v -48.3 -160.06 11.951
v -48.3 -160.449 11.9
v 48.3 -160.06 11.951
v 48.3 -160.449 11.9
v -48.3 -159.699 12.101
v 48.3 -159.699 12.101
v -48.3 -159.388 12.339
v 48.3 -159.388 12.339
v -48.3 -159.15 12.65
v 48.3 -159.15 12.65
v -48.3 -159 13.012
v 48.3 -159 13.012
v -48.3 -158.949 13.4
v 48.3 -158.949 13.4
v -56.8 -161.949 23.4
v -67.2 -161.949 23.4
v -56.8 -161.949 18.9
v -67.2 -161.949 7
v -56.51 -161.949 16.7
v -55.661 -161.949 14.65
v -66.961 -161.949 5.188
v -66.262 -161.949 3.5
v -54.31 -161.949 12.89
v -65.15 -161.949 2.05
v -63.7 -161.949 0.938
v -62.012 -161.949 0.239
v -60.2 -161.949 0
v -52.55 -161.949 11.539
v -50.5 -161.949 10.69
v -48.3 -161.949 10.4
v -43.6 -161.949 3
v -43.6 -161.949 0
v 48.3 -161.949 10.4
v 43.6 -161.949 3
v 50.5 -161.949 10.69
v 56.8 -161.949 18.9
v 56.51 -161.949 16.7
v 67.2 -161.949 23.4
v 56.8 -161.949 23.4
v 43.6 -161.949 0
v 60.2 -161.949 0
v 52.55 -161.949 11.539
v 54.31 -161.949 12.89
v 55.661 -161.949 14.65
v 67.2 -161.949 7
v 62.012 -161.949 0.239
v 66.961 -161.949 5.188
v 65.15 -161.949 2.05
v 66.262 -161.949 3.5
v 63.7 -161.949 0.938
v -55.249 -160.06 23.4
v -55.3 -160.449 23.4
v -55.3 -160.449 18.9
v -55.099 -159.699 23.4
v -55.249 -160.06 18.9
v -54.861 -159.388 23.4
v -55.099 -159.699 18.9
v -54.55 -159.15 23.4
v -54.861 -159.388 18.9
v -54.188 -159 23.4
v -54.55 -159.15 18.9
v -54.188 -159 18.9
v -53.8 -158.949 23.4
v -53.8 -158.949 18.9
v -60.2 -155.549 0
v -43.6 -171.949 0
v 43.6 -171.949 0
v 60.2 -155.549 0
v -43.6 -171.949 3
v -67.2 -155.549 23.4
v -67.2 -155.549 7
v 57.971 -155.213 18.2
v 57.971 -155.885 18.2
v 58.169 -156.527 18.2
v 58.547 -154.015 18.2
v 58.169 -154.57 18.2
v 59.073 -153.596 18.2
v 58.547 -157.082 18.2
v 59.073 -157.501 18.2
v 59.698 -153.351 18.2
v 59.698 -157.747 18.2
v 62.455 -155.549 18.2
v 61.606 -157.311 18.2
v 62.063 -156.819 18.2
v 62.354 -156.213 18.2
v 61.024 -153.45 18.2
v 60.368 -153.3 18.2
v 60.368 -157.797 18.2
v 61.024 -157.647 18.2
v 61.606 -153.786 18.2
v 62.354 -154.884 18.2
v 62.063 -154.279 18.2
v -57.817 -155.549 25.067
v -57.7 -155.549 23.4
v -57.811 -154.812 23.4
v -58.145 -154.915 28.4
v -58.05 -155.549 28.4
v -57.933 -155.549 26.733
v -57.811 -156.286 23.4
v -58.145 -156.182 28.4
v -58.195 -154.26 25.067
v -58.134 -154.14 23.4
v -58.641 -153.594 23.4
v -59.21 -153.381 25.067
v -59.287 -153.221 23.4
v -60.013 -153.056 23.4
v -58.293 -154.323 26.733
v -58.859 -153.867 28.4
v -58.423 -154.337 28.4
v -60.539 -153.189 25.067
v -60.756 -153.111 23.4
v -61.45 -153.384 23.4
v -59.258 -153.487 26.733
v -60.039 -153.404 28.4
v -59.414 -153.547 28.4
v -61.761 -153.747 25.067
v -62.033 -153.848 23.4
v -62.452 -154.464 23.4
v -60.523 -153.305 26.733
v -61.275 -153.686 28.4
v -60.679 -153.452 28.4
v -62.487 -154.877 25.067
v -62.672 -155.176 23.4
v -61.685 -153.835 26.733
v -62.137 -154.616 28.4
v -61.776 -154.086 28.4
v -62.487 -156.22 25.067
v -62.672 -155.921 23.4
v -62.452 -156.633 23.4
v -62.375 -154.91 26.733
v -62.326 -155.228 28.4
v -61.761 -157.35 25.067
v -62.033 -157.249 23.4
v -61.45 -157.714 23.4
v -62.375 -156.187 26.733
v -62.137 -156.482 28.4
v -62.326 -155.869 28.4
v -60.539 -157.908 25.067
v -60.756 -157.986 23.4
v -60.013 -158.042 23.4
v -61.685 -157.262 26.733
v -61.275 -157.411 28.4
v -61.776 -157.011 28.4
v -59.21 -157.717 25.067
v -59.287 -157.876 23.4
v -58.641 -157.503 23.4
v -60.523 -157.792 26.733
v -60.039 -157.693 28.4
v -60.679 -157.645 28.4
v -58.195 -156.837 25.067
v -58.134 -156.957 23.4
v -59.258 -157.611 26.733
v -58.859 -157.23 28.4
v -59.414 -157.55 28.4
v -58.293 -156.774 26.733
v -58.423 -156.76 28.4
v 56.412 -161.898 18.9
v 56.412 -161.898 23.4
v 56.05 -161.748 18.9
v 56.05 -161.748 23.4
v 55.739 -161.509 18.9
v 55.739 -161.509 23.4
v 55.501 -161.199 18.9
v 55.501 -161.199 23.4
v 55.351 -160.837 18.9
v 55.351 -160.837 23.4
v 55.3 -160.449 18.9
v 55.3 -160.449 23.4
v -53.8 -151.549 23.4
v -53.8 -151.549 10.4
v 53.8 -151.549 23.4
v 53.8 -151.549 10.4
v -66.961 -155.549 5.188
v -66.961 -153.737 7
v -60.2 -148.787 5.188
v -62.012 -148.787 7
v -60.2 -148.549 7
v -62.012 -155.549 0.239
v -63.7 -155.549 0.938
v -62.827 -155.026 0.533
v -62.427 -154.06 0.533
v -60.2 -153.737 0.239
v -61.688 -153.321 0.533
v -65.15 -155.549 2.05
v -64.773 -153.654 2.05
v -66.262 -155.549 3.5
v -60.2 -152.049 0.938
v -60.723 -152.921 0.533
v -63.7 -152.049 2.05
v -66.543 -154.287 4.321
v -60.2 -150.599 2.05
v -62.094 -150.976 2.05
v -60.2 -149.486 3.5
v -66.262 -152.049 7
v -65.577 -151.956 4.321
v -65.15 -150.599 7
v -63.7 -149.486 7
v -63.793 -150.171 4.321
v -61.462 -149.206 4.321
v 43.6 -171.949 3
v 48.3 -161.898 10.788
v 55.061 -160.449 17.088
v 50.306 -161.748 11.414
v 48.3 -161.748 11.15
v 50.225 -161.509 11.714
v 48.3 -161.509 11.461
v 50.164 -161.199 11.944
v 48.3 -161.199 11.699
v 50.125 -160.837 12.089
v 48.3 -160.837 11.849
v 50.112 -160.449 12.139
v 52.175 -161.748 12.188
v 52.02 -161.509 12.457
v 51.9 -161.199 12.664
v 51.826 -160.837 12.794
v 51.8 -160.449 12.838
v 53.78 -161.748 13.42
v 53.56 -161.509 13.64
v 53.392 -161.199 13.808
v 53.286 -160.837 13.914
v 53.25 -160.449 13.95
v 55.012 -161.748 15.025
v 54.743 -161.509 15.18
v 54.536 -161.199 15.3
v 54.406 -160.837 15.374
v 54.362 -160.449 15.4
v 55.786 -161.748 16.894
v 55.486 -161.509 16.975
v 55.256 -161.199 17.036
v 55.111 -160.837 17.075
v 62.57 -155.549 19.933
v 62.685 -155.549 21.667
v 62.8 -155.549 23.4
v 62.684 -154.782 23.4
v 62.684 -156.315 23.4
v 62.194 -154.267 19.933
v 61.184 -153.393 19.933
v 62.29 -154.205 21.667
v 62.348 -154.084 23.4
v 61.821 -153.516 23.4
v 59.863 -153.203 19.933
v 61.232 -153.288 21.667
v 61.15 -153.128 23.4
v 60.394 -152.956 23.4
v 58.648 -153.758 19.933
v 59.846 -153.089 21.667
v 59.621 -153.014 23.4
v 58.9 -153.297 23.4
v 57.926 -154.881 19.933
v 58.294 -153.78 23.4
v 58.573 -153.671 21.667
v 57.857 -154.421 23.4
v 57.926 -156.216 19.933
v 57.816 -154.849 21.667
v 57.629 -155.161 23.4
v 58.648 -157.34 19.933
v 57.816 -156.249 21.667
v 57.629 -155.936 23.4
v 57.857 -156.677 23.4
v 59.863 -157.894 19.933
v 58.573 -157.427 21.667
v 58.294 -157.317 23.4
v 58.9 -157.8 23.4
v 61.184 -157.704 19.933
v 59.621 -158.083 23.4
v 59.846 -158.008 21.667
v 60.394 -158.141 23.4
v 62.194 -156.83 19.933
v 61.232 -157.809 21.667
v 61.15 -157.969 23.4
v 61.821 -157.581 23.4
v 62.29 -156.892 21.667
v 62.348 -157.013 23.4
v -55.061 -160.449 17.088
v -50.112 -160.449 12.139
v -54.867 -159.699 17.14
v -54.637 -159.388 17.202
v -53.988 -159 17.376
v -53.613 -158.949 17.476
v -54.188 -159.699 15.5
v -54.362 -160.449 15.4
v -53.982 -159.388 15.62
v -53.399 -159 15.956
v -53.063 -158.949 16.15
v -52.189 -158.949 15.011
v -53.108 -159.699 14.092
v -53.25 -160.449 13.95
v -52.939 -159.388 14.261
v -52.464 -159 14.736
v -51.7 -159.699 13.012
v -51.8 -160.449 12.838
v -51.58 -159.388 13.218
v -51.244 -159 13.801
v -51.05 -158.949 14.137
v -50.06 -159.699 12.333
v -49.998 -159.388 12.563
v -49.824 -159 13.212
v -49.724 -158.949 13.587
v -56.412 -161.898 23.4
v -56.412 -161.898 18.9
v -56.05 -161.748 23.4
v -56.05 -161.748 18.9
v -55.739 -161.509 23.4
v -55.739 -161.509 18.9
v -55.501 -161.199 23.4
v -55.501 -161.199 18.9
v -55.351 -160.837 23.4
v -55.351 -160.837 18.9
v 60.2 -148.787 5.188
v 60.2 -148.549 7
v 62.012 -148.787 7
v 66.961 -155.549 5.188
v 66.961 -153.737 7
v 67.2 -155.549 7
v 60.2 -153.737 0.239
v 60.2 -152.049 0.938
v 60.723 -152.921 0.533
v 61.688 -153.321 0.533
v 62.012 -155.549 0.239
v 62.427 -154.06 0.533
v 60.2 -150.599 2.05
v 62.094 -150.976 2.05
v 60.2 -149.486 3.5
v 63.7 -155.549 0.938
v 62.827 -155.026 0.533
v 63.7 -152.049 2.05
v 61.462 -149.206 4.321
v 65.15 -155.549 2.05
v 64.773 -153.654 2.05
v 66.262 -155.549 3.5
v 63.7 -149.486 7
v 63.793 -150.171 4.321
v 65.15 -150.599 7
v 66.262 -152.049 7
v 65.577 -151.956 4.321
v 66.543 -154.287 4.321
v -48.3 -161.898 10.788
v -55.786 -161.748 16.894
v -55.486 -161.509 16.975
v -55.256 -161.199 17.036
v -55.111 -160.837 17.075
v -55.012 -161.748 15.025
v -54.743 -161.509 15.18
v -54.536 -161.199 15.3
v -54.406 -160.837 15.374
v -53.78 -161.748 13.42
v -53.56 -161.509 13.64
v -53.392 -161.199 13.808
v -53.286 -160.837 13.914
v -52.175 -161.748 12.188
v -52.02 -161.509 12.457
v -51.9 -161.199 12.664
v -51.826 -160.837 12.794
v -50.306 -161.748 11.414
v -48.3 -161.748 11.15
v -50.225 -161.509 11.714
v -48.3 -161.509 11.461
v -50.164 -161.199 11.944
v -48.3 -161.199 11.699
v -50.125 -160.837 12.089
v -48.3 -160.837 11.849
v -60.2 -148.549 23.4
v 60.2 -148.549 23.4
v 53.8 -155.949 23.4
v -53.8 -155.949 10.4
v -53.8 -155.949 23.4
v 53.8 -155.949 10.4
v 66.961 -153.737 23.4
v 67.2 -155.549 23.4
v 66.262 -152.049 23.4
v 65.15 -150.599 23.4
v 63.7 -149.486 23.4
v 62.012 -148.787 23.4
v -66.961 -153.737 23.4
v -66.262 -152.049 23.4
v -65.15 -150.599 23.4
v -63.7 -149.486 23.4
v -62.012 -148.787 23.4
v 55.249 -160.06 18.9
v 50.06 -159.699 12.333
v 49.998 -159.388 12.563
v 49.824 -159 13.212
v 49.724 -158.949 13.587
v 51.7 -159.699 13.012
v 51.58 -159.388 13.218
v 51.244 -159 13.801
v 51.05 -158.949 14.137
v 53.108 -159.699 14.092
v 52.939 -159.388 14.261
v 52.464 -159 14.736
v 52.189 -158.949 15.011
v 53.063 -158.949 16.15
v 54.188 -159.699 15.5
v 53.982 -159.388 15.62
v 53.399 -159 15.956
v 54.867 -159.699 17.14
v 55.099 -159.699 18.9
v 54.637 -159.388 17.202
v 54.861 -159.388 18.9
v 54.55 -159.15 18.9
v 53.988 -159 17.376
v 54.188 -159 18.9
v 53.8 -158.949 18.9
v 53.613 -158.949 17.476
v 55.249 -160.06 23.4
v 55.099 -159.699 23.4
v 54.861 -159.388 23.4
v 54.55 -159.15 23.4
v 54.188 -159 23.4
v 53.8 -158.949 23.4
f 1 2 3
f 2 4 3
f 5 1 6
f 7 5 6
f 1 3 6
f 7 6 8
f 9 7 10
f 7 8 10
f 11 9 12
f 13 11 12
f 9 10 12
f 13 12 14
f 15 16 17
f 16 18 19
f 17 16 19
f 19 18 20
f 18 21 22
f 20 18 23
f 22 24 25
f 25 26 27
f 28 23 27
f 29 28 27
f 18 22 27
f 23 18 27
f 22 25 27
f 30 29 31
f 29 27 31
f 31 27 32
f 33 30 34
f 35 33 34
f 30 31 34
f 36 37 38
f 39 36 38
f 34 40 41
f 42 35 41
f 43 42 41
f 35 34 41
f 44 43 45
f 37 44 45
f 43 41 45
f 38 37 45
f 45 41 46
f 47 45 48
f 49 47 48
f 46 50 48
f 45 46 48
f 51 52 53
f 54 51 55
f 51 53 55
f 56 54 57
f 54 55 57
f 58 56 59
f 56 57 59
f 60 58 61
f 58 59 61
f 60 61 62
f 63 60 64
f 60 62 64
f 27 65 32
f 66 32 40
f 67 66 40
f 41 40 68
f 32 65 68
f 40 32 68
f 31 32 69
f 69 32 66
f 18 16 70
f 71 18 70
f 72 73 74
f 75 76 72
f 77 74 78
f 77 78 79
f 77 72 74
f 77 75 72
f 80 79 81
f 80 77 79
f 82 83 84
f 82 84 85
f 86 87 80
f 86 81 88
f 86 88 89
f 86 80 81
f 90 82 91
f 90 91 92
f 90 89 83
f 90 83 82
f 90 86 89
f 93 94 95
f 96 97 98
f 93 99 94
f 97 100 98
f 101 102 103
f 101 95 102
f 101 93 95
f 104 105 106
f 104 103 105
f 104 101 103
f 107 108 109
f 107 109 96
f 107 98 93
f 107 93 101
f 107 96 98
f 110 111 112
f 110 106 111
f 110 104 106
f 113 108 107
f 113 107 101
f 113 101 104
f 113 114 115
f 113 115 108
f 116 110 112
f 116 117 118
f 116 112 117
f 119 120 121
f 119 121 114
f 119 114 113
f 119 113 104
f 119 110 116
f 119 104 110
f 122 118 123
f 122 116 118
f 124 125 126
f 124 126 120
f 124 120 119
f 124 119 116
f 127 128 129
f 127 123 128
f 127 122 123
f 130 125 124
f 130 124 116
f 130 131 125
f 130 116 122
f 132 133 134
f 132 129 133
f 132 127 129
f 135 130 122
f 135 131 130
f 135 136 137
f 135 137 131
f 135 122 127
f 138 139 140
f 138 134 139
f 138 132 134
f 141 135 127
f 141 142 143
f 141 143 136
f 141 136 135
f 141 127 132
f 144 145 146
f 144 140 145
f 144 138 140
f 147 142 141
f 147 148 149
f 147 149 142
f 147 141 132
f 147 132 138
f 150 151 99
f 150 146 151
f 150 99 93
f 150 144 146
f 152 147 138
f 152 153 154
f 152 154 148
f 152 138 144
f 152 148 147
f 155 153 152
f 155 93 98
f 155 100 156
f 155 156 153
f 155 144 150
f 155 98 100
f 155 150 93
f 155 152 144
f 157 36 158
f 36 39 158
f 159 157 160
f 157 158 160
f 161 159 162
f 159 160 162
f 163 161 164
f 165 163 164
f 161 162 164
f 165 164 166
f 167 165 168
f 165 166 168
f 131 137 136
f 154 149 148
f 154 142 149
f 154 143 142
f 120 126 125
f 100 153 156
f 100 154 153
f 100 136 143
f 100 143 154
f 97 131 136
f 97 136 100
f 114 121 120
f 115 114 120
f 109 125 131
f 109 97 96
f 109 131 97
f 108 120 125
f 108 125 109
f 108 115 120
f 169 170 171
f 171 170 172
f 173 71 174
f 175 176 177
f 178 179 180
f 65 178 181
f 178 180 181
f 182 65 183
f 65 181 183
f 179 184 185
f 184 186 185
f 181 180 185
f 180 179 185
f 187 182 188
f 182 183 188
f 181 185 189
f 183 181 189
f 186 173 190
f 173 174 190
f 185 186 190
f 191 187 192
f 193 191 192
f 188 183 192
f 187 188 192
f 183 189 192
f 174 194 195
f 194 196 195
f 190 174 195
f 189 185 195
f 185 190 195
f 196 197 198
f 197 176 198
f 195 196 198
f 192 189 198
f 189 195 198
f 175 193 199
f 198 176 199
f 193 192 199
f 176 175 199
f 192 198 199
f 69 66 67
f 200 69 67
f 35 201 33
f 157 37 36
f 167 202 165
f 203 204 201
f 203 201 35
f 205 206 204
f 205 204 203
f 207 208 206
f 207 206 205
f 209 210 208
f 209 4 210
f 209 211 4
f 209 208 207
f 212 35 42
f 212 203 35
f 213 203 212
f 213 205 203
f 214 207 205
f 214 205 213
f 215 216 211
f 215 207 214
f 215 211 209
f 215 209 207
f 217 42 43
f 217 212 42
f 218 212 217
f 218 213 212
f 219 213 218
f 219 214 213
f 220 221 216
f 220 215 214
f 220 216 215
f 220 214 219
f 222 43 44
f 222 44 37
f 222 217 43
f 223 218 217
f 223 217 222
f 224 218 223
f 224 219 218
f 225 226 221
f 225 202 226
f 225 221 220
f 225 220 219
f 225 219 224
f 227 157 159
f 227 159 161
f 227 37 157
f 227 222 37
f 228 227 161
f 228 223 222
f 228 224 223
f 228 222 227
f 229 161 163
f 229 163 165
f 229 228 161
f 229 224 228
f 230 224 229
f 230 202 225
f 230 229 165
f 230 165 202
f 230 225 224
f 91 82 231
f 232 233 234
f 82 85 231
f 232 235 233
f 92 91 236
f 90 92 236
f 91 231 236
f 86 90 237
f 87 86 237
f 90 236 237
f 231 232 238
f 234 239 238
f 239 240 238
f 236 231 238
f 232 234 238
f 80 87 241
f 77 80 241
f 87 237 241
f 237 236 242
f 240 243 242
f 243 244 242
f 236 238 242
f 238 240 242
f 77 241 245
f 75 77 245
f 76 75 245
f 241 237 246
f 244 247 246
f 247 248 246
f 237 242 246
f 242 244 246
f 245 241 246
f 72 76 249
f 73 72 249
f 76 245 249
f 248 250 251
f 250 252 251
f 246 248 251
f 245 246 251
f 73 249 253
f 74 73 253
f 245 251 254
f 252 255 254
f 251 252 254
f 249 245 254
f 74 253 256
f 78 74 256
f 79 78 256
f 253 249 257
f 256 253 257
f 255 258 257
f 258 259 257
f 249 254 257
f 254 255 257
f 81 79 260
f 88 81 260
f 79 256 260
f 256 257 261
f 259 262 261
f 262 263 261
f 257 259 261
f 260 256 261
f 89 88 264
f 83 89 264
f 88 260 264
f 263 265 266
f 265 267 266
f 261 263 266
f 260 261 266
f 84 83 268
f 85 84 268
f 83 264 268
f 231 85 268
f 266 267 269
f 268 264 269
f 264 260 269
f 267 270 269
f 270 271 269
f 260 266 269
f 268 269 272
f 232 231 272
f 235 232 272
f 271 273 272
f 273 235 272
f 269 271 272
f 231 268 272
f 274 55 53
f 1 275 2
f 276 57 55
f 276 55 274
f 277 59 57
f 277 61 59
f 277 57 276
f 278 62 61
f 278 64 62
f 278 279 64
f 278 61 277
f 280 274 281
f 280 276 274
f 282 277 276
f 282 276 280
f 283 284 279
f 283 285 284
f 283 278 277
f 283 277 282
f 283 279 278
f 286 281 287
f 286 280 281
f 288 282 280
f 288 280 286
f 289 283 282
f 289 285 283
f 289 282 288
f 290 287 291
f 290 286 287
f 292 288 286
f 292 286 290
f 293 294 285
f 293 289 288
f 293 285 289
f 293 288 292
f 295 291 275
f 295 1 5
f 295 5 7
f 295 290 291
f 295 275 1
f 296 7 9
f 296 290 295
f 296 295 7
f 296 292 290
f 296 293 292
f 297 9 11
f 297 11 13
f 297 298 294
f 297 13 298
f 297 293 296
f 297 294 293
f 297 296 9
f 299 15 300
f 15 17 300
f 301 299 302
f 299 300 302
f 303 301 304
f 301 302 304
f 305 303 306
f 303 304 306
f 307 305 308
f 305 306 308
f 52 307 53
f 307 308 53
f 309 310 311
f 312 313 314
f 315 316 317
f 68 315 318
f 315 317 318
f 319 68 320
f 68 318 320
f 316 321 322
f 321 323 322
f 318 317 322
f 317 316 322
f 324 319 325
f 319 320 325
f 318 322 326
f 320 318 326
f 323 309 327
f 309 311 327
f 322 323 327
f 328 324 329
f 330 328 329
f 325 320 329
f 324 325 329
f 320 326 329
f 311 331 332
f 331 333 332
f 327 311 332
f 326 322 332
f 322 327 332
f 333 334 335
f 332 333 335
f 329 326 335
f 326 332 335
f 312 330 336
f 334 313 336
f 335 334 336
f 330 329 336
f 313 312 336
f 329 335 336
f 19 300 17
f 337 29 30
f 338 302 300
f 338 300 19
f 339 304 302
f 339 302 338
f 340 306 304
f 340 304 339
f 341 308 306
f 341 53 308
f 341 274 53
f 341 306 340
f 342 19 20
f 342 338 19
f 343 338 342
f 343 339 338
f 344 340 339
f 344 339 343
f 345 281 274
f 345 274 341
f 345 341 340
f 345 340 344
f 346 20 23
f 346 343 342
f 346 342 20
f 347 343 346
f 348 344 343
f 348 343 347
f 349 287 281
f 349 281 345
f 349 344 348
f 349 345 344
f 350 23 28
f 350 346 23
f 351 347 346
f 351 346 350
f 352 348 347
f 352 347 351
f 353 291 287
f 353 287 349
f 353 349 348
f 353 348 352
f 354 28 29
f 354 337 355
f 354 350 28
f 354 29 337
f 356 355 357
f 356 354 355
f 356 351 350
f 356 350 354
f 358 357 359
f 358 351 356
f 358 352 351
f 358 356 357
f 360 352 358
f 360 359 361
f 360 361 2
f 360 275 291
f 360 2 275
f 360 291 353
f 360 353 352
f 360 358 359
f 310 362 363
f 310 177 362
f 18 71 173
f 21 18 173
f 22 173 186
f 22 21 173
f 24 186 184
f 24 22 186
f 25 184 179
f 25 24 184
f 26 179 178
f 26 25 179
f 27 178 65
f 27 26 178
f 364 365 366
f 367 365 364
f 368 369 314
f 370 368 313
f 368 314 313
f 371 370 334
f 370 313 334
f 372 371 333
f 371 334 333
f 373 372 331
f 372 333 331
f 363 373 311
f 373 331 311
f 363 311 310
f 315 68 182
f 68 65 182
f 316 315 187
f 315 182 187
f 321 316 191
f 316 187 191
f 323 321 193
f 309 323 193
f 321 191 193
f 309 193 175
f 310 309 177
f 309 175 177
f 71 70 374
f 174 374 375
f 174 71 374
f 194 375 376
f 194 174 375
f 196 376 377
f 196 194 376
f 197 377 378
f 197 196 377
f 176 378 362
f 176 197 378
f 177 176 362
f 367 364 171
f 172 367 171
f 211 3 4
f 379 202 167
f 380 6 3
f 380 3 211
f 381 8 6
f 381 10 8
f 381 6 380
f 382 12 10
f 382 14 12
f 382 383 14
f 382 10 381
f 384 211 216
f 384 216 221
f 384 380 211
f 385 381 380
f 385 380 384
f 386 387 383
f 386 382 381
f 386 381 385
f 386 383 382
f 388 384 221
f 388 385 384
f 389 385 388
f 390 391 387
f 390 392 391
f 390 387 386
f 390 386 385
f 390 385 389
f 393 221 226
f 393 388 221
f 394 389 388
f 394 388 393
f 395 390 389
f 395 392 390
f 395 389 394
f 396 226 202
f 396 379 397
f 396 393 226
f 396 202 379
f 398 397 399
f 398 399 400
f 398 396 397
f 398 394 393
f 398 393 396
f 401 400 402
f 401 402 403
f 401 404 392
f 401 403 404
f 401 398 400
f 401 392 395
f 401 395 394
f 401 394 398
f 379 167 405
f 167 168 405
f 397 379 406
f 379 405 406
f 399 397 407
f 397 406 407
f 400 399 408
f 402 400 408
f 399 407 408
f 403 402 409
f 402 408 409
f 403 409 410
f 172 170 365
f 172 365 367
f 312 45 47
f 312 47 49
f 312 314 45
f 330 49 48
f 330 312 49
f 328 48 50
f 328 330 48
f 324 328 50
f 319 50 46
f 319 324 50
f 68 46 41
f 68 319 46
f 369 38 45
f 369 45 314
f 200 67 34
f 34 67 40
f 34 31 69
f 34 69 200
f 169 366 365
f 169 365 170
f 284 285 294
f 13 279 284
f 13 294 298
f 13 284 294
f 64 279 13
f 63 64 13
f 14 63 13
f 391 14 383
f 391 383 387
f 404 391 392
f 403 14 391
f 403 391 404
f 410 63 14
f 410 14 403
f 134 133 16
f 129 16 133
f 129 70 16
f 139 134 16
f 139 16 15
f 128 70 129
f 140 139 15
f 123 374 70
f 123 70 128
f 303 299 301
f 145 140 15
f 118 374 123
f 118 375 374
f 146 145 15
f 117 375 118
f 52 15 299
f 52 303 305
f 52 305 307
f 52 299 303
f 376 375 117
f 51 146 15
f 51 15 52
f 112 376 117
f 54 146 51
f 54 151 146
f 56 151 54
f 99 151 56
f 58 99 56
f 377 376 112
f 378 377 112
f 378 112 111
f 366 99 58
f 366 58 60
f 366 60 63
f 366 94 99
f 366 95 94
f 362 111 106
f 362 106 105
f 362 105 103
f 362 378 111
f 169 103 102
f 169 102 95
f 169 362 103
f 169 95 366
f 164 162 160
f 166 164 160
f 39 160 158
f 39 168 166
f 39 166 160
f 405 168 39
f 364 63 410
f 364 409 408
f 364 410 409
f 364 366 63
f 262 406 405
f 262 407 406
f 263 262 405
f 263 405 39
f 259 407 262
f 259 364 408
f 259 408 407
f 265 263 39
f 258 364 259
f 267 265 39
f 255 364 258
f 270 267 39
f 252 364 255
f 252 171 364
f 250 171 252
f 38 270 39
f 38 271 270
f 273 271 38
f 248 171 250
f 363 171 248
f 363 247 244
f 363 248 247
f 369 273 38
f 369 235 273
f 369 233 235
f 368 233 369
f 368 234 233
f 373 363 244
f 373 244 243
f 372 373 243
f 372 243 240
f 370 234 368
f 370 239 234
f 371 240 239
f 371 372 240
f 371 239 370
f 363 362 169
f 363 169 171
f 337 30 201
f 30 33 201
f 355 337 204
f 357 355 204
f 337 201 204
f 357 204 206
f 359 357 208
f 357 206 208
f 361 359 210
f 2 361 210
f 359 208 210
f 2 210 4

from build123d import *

# Parameters (mm, degrees)
EXTRUDE1_DEPTH     = 3
SKETCH3_W          = 134.4
SKETCH3_H          = 13.4
EXTRUDE2_DEPTH     = 7.4
SKETCH4_W          = 134.4
SKETCH4_H          = 13.4
SKETCH4_W_2        = 107.6
SKETCH4_H_2        = 4.4
EXTRUDE3_DEPTH     = 13
FILLET1_R          = 7
CUT_EXTRUDE1_DEPTH = 3
FILLET2_R          = 1.5
SKETCH7_R          = 2.5
EXTRUDE4_DEPTH     = 5
EXTRUDE4_TAPER     = 4
SKETCH8_R          = 2.6
CUT_EXTRUDE2_DEPTH = 5.2
CUT_EXTRUDE2_DRAFT = -3.8


with BuildPart() as part:
    # Sketch1 → Extrude1 (new body)
    with BuildSketch(Plane.XY):
        Polygon((-43.6, -161.948648405), (-43.6, -171.948648405), (43.6, -171.948648405), (43.6, -161.948648405), (67.2, -161.948648405), (67.2, -148.548648405), (-67.2, -148.548648405), (-67.2, -161.948648405), align=None)
    extrude(amount=EXTRUDE1_DEPTH)

    # Sketch3 → Extrude2 (add)
    with BuildSketch(Plane.XY.offset(3)):
        with Locations((0, -155.248648405)):
            Rectangle(SKETCH3_W, SKETCH3_H)
    extrude(amount=EXTRUDE2_DEPTH)

    # Sketch4 → Extrude3 (add)
    with BuildSketch(Plane.XY.offset(10.4)):
        with Locations((0, -155.248648405)):
            Rectangle(SKETCH4_W, SKETCH4_H)
        with Locations((0, -153.748648405)):
            Rectangle(SKETCH4_W_2, SKETCH4_H_2, mode=Mode.SUBTRACT)
    extrude(amount=EXTRUDE3_DEPTH)

    # Fillet1
    fillet1_edges = [part.edges().sort_by_distance(p)[0] for p in [
        (-67.2, -148.548648405, 11.7),
        (67.2, -148.548648405, 11.7),
        (-67.2, -155.248648405, 0),
        (0, -148.548648405, 0),
        (67.2, -155.248648405, 0),
    ]]
    fillet(fillet1_edges, radius=FILLET1_R)

    # Sketch6 → Cut-Extrude1 (cut)
    with BuildSketch(Plane.XZ.offset(161.948648405)):
        with BuildLine():
            Line((-55.3, 23.4), (-55.3, 18.9))
            ThreePointArc((-55.3, 18.9), (-53.249747468, 13.950252532), (-48.3, 11.9))
            Line((-48.3, 11.9), (48.3, 11.9))
            ThreePointArc((48.3, 11.9), (53.249747468, 13.950252532), (55.3, 18.9))
            Line((55.3, 18.9), (55.3, 23.4))
            Line((55.3, 23.4), (-55.3, 23.4))
        make_face()
    extrude(amount=-CUT_EXTRUDE1_DEPTH, mode=Mode.SUBTRACT)

    # Fillet2
    fillet2_edges = [part.edges().sort_by_distance(p)[0] for p in [
        (55.3, -158.948648405, 21.15),
        (53.249747468, -158.948648405, 13.950252532),
        (0, -158.948648405, 11.9),
        (-53.249747468, -158.948648405, 13.950252532),
        (-55.3, -158.948648405, 21.15),
        (-55.3, -161.948648405, 21.15),
        (-53.249747468, -161.948648405, 13.950252532),
        (55.3, -161.948648405, 21.15),
        (53.249747468, -161.948648405, 13.950252532),
        (0, -161.948648405, 11.9),
    ]]
    fillet(fillet2_edges, radius=FILLET2_R - 0.0001)  # a hair under: the kernel refuses the full size

    # Sketch7 → Extrude4 (add)
    with BuildSketch(Plane.XY.offset(23.4)):
        with Locations((-60.2, -155.548648405)):
            Circle(SKETCH7_R)
    extrude(amount=EXTRUDE4_DEPTH, taper=EXTRUDE4_TAPER)


with BuildPart() as cut_extrude2_tool:
    # Sketch8 → Cut-Extrude2 (with draft: the straight prism first)
    with BuildSketch(Plane.XY.offset(23.4)):
        with Locations((60.2, -155.548648405)):
            Circle(SKETCH8_R)
    extrude(amount=-CUT_EXTRUDE2_DEPTH)
    # Cut-Extrude2: the draft: its side faces are tilted about the plane it starts from
    cut_extrude2_sides = [cut_extrude2_tool.faces().sort_by_distance(p)[0] for p in [
        (57.6, -155.548648405, 20.8),
    ]]
    draft(cut_extrude2_sides, Plane.XY.offset(23.4), CUT_EXTRUDE2_DRAFT)


with BuildPart() as part_1:
    add(part.part)

    # Cut-Extrude2: cut by cut_extrude2_tool
    add(cut_extrude2_tool.part, mode=Mode.SUBTRACT)


solid = part_1.part
